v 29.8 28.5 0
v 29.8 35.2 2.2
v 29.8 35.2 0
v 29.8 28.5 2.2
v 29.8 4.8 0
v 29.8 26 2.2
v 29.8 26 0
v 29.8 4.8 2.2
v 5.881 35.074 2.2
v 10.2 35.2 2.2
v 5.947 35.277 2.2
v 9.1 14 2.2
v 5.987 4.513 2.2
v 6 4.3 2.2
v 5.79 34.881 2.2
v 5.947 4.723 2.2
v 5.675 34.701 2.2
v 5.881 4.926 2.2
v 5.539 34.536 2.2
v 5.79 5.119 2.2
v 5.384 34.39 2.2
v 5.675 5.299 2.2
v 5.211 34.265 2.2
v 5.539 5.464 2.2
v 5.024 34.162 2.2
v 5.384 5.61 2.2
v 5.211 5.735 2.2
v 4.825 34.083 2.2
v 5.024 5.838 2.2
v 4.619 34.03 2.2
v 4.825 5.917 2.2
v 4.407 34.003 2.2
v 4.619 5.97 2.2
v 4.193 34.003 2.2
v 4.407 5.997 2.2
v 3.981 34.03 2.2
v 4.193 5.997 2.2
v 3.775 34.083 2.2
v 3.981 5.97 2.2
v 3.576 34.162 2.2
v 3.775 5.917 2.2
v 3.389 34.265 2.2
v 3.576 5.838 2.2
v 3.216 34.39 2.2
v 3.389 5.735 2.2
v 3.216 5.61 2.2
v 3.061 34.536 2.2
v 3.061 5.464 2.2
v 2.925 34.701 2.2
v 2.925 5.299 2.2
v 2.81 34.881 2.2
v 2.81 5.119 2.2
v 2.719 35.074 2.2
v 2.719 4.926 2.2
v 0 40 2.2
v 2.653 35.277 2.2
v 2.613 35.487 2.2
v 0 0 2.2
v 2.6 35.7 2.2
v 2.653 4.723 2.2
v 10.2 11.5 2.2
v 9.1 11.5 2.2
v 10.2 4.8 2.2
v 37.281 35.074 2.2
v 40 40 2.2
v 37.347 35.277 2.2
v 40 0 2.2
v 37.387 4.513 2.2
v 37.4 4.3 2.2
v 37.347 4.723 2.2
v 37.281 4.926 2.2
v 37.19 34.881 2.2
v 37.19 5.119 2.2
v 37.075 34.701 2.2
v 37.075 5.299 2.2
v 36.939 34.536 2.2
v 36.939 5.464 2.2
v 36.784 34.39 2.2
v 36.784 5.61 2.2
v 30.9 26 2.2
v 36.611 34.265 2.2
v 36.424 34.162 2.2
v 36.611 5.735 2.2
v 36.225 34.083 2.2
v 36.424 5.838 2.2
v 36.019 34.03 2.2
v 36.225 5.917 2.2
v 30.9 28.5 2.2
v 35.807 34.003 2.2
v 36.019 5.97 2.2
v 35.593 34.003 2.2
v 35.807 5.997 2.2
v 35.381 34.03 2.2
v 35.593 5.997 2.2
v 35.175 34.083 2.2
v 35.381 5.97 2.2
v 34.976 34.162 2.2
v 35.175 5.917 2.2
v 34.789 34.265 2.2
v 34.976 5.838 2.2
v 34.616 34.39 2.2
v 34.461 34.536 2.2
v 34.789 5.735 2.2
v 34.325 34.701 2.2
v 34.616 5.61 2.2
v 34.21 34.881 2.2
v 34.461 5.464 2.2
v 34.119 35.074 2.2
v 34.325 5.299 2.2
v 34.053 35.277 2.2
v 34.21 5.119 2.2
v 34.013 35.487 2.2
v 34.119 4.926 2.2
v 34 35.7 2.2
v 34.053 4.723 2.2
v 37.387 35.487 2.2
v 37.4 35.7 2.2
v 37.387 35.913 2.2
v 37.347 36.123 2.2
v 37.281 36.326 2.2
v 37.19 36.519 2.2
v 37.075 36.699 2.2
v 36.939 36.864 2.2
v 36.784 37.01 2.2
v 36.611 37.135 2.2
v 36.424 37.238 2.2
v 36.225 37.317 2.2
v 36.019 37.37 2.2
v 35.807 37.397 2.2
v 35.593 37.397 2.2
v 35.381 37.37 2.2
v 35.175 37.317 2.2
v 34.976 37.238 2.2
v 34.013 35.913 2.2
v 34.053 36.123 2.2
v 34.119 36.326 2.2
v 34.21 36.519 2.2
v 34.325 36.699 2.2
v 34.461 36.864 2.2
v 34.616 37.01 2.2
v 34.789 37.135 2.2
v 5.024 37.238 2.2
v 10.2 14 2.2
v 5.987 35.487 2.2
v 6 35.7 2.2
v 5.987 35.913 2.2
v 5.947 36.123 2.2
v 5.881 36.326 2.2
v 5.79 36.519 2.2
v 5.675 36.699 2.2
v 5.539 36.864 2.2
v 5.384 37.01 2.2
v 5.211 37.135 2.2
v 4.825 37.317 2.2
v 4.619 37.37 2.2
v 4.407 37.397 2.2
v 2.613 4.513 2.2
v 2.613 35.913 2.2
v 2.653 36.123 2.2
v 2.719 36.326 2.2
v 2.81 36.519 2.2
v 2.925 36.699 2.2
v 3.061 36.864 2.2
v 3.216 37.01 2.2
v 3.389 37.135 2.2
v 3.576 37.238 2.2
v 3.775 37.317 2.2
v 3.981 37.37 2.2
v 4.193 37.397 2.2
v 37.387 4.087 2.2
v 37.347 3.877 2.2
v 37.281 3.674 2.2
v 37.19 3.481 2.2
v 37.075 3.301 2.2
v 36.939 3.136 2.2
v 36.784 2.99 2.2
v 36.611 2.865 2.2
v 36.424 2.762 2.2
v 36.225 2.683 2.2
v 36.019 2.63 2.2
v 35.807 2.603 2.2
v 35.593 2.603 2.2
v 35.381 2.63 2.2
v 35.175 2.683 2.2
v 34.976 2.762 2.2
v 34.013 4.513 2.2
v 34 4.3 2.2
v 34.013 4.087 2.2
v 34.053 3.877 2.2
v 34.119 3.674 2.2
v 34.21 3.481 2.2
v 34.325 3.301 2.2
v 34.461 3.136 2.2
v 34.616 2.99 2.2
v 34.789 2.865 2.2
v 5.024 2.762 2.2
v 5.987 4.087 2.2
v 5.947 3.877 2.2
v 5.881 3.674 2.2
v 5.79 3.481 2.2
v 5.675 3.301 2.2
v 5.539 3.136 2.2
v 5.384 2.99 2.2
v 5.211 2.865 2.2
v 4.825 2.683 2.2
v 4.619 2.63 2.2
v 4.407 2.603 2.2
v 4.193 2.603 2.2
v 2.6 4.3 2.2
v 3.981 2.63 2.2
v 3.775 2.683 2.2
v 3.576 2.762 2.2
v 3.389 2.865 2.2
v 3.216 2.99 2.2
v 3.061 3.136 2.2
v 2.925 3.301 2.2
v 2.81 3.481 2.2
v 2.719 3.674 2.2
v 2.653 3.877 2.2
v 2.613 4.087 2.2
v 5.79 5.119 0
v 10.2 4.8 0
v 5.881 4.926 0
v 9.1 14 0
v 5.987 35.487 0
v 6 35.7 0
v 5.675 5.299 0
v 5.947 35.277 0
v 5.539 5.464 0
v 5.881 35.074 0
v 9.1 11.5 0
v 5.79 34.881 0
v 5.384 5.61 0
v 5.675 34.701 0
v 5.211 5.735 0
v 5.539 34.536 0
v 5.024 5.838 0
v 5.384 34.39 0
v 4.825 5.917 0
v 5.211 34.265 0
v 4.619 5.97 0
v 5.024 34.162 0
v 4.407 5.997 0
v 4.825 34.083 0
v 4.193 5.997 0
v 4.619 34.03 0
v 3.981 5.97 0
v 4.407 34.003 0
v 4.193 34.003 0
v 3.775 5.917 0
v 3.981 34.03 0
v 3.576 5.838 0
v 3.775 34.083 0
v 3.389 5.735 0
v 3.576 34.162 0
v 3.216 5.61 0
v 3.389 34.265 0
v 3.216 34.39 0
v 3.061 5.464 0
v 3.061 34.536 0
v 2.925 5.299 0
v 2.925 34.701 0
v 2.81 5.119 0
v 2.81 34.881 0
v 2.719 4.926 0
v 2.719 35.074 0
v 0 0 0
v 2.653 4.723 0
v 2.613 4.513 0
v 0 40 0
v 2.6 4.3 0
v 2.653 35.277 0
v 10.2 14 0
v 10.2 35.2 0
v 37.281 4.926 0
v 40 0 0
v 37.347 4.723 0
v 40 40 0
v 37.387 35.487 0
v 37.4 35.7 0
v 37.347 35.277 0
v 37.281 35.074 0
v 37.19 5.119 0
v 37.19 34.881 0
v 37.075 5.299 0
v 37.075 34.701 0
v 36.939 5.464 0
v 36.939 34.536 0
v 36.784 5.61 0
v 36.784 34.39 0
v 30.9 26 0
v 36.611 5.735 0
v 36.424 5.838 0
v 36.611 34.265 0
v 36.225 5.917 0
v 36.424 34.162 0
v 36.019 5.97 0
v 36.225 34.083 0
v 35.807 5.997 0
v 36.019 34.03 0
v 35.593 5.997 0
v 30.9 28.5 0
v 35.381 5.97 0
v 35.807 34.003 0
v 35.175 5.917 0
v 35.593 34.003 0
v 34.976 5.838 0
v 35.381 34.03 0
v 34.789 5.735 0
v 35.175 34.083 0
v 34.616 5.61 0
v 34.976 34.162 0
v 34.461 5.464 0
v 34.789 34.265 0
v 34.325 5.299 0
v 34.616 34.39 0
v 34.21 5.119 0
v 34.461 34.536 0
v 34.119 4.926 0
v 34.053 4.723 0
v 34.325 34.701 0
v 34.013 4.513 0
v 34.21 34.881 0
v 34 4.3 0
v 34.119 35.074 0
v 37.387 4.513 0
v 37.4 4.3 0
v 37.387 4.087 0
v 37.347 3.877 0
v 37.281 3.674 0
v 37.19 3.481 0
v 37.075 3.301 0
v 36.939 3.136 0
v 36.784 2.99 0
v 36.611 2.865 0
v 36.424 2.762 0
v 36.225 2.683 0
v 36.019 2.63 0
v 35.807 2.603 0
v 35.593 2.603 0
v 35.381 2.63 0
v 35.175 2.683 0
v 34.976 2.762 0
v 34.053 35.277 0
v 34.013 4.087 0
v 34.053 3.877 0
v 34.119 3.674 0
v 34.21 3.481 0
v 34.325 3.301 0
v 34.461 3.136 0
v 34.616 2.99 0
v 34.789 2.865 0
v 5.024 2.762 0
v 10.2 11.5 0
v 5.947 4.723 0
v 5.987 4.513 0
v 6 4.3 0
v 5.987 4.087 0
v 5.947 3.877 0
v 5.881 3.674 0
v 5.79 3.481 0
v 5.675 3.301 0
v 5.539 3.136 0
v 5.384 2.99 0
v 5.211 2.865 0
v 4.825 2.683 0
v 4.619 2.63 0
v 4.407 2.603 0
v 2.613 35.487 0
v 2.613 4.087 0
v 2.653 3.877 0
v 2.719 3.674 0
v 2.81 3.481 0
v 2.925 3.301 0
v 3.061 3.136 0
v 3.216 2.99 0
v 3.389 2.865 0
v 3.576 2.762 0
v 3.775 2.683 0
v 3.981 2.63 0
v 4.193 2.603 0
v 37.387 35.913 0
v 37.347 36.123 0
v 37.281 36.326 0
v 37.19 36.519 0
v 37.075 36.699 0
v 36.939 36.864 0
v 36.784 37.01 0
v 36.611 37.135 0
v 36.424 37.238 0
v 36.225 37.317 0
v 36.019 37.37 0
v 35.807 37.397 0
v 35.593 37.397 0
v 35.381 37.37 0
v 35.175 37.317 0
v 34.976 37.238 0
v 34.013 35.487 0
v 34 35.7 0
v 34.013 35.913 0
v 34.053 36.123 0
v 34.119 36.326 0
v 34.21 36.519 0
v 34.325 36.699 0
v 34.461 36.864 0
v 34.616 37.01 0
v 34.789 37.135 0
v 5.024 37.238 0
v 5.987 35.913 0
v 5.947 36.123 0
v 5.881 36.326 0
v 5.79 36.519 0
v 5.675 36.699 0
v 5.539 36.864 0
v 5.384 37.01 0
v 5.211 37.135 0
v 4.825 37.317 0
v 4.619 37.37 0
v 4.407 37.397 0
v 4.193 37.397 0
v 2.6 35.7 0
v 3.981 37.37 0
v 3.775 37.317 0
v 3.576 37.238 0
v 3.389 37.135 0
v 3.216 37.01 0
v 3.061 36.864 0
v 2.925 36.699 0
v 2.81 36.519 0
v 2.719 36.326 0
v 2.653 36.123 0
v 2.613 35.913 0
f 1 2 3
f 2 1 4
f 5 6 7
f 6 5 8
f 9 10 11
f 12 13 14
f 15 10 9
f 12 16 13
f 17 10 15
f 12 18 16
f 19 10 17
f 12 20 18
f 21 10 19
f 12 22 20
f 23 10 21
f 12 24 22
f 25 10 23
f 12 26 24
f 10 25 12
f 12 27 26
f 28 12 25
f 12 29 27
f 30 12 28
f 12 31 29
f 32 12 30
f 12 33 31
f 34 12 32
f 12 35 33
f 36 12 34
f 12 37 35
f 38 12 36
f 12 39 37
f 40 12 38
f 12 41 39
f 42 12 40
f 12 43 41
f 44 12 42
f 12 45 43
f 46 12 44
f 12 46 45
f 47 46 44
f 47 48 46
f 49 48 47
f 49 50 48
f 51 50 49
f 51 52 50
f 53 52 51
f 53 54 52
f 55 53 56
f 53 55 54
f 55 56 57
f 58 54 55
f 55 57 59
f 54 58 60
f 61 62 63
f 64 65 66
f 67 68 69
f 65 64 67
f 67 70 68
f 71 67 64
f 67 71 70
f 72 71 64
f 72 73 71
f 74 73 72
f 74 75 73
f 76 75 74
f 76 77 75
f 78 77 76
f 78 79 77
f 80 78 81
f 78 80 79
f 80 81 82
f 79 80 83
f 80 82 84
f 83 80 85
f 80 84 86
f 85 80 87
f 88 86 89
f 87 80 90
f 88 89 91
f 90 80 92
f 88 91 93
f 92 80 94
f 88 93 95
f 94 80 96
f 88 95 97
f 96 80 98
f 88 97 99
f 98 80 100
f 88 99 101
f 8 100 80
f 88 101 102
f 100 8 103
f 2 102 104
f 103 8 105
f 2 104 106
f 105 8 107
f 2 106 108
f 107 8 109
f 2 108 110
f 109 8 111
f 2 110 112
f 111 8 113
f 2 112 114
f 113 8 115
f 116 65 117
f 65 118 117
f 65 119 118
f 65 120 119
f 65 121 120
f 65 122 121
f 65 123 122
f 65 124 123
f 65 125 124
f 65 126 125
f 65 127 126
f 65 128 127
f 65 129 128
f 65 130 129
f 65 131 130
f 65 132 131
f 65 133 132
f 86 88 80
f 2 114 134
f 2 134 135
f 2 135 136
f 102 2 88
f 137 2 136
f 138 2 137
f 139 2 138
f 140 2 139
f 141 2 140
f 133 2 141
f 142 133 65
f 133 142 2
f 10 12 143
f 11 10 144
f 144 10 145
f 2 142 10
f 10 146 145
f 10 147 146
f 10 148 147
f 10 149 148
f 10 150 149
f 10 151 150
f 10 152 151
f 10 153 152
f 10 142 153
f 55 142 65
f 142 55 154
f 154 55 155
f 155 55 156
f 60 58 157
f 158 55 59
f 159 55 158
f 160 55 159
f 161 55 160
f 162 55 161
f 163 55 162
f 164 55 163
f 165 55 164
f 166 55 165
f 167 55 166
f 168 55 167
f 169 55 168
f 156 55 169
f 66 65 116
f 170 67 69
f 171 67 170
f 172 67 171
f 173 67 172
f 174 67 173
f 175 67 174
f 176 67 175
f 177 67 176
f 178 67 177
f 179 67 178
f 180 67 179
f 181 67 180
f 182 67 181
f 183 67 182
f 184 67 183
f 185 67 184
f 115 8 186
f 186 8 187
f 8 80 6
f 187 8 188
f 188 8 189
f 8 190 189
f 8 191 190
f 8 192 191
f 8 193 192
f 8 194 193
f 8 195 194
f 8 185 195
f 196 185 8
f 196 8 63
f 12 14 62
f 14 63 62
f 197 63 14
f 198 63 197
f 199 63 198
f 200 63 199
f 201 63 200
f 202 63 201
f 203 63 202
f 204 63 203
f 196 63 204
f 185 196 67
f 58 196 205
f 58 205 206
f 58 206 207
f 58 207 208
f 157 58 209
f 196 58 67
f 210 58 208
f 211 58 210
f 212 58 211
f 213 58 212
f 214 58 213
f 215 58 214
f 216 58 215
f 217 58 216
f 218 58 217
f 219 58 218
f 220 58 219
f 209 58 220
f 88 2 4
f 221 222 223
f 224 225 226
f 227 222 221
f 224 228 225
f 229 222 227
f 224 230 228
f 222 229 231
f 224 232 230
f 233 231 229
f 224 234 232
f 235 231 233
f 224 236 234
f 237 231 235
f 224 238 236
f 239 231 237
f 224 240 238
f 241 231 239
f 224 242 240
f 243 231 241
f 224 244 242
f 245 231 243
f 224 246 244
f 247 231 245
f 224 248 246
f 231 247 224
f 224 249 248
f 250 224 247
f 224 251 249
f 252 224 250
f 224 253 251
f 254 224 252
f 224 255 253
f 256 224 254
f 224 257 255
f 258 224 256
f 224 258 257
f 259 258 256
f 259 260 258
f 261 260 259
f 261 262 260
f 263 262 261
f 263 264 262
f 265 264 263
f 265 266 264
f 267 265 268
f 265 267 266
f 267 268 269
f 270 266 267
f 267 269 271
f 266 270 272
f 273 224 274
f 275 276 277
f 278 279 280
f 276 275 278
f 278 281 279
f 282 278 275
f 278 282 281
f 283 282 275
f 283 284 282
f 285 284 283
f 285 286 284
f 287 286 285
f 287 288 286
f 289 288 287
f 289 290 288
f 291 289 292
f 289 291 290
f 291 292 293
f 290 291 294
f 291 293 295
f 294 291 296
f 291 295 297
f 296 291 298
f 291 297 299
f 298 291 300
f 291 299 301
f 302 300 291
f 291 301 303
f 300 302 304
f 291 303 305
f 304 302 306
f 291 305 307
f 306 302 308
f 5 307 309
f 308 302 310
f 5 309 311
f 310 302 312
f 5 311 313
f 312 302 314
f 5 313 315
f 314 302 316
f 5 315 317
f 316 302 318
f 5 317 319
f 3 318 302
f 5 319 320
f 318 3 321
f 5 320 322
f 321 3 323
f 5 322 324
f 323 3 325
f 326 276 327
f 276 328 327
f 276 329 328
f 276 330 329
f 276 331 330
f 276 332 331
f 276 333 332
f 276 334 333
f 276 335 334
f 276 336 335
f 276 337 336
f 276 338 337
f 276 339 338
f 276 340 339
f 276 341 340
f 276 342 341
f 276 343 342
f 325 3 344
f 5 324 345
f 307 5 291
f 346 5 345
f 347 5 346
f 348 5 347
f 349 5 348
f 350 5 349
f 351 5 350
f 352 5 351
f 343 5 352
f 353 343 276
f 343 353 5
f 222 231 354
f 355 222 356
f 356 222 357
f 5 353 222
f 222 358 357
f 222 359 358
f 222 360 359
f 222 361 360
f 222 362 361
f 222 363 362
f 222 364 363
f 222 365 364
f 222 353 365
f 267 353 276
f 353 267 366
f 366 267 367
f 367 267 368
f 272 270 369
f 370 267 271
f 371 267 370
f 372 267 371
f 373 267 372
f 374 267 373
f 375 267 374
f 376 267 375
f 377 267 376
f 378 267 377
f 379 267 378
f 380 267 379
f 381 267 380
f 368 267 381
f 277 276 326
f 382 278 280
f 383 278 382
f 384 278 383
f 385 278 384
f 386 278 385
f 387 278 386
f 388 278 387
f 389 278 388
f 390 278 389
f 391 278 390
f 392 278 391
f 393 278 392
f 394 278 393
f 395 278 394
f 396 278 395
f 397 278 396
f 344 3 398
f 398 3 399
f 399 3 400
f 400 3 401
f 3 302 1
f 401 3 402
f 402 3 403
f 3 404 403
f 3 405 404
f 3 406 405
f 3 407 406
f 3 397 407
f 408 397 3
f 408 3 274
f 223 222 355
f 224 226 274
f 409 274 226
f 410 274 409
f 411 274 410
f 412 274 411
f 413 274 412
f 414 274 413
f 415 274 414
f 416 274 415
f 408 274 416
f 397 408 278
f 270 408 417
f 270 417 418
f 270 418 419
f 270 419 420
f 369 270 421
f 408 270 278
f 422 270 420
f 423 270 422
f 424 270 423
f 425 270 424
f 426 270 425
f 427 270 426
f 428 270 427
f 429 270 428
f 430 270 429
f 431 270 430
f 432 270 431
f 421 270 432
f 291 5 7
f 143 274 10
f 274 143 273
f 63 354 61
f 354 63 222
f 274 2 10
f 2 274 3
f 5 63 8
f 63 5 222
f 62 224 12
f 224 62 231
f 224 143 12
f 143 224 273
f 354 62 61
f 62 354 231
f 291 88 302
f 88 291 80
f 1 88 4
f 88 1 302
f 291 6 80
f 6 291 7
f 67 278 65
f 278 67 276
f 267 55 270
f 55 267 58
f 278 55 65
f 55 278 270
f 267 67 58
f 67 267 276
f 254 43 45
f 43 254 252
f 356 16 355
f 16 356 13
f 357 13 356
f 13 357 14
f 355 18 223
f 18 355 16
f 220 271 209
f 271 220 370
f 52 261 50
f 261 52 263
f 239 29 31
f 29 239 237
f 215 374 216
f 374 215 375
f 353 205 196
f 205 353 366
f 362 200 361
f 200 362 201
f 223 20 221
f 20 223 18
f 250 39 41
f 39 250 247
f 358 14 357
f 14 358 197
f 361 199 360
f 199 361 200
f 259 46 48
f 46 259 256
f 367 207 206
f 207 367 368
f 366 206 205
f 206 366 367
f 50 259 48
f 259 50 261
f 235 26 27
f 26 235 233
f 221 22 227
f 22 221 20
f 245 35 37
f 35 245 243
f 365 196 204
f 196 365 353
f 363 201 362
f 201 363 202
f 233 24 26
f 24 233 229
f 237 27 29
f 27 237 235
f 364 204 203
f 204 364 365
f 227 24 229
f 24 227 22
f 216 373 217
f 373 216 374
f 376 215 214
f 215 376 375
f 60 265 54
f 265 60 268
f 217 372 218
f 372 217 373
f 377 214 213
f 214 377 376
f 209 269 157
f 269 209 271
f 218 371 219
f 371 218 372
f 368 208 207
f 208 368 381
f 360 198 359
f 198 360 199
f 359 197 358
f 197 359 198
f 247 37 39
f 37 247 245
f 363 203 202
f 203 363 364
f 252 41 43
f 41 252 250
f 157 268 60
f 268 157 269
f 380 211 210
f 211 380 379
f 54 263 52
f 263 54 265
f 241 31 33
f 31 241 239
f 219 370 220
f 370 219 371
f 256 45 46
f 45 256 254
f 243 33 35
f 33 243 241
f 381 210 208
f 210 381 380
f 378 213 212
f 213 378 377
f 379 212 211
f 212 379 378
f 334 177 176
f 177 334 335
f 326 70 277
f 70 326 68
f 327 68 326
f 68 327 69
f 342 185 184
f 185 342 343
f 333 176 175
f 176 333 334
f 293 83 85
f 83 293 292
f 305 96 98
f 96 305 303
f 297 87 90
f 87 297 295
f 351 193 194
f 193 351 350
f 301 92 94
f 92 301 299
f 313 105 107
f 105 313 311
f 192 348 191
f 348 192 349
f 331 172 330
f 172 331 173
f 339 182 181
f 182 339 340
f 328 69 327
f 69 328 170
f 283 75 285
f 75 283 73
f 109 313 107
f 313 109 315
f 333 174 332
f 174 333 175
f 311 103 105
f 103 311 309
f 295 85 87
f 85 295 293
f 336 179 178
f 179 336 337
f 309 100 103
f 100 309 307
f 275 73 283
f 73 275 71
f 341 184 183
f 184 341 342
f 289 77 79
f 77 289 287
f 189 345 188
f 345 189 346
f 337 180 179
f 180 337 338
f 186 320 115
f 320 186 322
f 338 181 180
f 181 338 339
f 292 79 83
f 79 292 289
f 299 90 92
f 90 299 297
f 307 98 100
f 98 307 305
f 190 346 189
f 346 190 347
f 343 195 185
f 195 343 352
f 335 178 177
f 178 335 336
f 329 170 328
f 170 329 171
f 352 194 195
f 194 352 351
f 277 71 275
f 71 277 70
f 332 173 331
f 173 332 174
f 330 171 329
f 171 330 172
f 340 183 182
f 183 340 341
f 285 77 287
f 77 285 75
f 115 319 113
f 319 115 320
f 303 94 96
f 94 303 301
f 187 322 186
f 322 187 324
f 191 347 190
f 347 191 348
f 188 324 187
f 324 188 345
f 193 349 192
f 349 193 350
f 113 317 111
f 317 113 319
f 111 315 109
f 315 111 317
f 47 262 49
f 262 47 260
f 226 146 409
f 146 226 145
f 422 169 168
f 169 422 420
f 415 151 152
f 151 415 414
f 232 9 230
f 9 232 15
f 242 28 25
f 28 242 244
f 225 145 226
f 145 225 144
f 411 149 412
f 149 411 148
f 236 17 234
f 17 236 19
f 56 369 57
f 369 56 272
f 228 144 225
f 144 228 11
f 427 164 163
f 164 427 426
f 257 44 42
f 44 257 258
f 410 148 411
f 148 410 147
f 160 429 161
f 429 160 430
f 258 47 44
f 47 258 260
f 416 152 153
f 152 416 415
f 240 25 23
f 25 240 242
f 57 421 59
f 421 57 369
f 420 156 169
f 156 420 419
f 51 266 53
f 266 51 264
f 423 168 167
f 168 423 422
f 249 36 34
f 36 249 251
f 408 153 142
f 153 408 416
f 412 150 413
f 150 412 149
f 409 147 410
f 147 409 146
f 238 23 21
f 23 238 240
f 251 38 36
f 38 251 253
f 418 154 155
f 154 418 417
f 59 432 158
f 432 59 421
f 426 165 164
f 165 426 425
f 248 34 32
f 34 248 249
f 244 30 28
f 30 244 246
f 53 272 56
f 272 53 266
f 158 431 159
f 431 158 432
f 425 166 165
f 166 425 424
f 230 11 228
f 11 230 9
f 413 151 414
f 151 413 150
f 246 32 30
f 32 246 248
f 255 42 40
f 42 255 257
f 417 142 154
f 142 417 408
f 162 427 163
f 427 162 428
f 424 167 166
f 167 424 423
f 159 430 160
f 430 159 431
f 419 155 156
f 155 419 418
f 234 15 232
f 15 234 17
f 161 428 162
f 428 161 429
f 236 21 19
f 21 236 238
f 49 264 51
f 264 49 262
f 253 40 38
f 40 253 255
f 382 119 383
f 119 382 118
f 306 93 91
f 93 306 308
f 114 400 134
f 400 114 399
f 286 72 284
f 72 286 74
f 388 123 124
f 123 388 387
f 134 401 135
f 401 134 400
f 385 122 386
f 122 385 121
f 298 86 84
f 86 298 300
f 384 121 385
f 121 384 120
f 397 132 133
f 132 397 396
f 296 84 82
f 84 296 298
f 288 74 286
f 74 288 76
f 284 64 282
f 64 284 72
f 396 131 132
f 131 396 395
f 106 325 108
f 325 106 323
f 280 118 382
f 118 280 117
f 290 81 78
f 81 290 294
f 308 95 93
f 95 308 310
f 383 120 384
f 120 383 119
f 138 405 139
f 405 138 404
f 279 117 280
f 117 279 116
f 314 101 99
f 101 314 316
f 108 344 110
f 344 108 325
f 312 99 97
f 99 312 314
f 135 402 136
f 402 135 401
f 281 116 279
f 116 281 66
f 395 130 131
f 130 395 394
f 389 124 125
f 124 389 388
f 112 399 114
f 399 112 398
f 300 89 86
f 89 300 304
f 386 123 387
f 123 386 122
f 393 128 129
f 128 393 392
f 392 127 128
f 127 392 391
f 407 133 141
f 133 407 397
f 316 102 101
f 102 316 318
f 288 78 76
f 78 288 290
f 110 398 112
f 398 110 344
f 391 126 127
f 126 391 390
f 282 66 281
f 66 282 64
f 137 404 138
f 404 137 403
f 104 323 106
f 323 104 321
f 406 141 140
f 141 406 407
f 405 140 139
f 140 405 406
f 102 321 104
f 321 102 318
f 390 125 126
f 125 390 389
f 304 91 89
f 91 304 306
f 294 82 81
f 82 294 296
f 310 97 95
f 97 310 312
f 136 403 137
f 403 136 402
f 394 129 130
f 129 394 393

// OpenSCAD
$fn = 50;

outside = 40;
screw_dia = 3.4;
plate_thickness = 2.2;
edge_dist = 2.6+(screw_dia/2);
fan_widths = 30.4;
fan_length = 19.6;
nub_height = 1.1;
nub_width = 2.5;
x_offset = (outside-fan_length)/2;
y_offset = (outside-fan_widths)/2;
center_offset = 6;
nub_small_y = (fan_widths/2)-(center_offset+nub_width);
nub_large_y = (fan_widths/2)+center_offset;


difference(){
    cube([outside, outside, plate_thickness]);
    translate([edge_dist, edge_dist, 0])
        cylinder(r = screw_dia/2, h = plate_thickness);
    translate([outside-edge_dist, edge_dist, 0])
        cylinder(r = screw_dia/2, h = plate_thickness);
    translate([edge_dist, outside-edge_dist, 0])
        cylinder(r = screw_dia/2, h = plate_thickness);
    translate([outside-edge_dist, outside-edge_dist, 0])
        cylinder(r = screw_dia/2, h = plate_thickness);
    
   translate([x_offset, y_offset, 0]){
       cube([fan_length, fan_widths, plate_thickness]);
       
        translate([-nub_height, nub_small_y, 0]){
            cube([nub_height, nub_width, plate_thickness]);
        }
       translate([fan_length, nub_large_y, 0]){
            cube([nub_height, nub_width, plate_thickness]);
       }
   }
    
}
